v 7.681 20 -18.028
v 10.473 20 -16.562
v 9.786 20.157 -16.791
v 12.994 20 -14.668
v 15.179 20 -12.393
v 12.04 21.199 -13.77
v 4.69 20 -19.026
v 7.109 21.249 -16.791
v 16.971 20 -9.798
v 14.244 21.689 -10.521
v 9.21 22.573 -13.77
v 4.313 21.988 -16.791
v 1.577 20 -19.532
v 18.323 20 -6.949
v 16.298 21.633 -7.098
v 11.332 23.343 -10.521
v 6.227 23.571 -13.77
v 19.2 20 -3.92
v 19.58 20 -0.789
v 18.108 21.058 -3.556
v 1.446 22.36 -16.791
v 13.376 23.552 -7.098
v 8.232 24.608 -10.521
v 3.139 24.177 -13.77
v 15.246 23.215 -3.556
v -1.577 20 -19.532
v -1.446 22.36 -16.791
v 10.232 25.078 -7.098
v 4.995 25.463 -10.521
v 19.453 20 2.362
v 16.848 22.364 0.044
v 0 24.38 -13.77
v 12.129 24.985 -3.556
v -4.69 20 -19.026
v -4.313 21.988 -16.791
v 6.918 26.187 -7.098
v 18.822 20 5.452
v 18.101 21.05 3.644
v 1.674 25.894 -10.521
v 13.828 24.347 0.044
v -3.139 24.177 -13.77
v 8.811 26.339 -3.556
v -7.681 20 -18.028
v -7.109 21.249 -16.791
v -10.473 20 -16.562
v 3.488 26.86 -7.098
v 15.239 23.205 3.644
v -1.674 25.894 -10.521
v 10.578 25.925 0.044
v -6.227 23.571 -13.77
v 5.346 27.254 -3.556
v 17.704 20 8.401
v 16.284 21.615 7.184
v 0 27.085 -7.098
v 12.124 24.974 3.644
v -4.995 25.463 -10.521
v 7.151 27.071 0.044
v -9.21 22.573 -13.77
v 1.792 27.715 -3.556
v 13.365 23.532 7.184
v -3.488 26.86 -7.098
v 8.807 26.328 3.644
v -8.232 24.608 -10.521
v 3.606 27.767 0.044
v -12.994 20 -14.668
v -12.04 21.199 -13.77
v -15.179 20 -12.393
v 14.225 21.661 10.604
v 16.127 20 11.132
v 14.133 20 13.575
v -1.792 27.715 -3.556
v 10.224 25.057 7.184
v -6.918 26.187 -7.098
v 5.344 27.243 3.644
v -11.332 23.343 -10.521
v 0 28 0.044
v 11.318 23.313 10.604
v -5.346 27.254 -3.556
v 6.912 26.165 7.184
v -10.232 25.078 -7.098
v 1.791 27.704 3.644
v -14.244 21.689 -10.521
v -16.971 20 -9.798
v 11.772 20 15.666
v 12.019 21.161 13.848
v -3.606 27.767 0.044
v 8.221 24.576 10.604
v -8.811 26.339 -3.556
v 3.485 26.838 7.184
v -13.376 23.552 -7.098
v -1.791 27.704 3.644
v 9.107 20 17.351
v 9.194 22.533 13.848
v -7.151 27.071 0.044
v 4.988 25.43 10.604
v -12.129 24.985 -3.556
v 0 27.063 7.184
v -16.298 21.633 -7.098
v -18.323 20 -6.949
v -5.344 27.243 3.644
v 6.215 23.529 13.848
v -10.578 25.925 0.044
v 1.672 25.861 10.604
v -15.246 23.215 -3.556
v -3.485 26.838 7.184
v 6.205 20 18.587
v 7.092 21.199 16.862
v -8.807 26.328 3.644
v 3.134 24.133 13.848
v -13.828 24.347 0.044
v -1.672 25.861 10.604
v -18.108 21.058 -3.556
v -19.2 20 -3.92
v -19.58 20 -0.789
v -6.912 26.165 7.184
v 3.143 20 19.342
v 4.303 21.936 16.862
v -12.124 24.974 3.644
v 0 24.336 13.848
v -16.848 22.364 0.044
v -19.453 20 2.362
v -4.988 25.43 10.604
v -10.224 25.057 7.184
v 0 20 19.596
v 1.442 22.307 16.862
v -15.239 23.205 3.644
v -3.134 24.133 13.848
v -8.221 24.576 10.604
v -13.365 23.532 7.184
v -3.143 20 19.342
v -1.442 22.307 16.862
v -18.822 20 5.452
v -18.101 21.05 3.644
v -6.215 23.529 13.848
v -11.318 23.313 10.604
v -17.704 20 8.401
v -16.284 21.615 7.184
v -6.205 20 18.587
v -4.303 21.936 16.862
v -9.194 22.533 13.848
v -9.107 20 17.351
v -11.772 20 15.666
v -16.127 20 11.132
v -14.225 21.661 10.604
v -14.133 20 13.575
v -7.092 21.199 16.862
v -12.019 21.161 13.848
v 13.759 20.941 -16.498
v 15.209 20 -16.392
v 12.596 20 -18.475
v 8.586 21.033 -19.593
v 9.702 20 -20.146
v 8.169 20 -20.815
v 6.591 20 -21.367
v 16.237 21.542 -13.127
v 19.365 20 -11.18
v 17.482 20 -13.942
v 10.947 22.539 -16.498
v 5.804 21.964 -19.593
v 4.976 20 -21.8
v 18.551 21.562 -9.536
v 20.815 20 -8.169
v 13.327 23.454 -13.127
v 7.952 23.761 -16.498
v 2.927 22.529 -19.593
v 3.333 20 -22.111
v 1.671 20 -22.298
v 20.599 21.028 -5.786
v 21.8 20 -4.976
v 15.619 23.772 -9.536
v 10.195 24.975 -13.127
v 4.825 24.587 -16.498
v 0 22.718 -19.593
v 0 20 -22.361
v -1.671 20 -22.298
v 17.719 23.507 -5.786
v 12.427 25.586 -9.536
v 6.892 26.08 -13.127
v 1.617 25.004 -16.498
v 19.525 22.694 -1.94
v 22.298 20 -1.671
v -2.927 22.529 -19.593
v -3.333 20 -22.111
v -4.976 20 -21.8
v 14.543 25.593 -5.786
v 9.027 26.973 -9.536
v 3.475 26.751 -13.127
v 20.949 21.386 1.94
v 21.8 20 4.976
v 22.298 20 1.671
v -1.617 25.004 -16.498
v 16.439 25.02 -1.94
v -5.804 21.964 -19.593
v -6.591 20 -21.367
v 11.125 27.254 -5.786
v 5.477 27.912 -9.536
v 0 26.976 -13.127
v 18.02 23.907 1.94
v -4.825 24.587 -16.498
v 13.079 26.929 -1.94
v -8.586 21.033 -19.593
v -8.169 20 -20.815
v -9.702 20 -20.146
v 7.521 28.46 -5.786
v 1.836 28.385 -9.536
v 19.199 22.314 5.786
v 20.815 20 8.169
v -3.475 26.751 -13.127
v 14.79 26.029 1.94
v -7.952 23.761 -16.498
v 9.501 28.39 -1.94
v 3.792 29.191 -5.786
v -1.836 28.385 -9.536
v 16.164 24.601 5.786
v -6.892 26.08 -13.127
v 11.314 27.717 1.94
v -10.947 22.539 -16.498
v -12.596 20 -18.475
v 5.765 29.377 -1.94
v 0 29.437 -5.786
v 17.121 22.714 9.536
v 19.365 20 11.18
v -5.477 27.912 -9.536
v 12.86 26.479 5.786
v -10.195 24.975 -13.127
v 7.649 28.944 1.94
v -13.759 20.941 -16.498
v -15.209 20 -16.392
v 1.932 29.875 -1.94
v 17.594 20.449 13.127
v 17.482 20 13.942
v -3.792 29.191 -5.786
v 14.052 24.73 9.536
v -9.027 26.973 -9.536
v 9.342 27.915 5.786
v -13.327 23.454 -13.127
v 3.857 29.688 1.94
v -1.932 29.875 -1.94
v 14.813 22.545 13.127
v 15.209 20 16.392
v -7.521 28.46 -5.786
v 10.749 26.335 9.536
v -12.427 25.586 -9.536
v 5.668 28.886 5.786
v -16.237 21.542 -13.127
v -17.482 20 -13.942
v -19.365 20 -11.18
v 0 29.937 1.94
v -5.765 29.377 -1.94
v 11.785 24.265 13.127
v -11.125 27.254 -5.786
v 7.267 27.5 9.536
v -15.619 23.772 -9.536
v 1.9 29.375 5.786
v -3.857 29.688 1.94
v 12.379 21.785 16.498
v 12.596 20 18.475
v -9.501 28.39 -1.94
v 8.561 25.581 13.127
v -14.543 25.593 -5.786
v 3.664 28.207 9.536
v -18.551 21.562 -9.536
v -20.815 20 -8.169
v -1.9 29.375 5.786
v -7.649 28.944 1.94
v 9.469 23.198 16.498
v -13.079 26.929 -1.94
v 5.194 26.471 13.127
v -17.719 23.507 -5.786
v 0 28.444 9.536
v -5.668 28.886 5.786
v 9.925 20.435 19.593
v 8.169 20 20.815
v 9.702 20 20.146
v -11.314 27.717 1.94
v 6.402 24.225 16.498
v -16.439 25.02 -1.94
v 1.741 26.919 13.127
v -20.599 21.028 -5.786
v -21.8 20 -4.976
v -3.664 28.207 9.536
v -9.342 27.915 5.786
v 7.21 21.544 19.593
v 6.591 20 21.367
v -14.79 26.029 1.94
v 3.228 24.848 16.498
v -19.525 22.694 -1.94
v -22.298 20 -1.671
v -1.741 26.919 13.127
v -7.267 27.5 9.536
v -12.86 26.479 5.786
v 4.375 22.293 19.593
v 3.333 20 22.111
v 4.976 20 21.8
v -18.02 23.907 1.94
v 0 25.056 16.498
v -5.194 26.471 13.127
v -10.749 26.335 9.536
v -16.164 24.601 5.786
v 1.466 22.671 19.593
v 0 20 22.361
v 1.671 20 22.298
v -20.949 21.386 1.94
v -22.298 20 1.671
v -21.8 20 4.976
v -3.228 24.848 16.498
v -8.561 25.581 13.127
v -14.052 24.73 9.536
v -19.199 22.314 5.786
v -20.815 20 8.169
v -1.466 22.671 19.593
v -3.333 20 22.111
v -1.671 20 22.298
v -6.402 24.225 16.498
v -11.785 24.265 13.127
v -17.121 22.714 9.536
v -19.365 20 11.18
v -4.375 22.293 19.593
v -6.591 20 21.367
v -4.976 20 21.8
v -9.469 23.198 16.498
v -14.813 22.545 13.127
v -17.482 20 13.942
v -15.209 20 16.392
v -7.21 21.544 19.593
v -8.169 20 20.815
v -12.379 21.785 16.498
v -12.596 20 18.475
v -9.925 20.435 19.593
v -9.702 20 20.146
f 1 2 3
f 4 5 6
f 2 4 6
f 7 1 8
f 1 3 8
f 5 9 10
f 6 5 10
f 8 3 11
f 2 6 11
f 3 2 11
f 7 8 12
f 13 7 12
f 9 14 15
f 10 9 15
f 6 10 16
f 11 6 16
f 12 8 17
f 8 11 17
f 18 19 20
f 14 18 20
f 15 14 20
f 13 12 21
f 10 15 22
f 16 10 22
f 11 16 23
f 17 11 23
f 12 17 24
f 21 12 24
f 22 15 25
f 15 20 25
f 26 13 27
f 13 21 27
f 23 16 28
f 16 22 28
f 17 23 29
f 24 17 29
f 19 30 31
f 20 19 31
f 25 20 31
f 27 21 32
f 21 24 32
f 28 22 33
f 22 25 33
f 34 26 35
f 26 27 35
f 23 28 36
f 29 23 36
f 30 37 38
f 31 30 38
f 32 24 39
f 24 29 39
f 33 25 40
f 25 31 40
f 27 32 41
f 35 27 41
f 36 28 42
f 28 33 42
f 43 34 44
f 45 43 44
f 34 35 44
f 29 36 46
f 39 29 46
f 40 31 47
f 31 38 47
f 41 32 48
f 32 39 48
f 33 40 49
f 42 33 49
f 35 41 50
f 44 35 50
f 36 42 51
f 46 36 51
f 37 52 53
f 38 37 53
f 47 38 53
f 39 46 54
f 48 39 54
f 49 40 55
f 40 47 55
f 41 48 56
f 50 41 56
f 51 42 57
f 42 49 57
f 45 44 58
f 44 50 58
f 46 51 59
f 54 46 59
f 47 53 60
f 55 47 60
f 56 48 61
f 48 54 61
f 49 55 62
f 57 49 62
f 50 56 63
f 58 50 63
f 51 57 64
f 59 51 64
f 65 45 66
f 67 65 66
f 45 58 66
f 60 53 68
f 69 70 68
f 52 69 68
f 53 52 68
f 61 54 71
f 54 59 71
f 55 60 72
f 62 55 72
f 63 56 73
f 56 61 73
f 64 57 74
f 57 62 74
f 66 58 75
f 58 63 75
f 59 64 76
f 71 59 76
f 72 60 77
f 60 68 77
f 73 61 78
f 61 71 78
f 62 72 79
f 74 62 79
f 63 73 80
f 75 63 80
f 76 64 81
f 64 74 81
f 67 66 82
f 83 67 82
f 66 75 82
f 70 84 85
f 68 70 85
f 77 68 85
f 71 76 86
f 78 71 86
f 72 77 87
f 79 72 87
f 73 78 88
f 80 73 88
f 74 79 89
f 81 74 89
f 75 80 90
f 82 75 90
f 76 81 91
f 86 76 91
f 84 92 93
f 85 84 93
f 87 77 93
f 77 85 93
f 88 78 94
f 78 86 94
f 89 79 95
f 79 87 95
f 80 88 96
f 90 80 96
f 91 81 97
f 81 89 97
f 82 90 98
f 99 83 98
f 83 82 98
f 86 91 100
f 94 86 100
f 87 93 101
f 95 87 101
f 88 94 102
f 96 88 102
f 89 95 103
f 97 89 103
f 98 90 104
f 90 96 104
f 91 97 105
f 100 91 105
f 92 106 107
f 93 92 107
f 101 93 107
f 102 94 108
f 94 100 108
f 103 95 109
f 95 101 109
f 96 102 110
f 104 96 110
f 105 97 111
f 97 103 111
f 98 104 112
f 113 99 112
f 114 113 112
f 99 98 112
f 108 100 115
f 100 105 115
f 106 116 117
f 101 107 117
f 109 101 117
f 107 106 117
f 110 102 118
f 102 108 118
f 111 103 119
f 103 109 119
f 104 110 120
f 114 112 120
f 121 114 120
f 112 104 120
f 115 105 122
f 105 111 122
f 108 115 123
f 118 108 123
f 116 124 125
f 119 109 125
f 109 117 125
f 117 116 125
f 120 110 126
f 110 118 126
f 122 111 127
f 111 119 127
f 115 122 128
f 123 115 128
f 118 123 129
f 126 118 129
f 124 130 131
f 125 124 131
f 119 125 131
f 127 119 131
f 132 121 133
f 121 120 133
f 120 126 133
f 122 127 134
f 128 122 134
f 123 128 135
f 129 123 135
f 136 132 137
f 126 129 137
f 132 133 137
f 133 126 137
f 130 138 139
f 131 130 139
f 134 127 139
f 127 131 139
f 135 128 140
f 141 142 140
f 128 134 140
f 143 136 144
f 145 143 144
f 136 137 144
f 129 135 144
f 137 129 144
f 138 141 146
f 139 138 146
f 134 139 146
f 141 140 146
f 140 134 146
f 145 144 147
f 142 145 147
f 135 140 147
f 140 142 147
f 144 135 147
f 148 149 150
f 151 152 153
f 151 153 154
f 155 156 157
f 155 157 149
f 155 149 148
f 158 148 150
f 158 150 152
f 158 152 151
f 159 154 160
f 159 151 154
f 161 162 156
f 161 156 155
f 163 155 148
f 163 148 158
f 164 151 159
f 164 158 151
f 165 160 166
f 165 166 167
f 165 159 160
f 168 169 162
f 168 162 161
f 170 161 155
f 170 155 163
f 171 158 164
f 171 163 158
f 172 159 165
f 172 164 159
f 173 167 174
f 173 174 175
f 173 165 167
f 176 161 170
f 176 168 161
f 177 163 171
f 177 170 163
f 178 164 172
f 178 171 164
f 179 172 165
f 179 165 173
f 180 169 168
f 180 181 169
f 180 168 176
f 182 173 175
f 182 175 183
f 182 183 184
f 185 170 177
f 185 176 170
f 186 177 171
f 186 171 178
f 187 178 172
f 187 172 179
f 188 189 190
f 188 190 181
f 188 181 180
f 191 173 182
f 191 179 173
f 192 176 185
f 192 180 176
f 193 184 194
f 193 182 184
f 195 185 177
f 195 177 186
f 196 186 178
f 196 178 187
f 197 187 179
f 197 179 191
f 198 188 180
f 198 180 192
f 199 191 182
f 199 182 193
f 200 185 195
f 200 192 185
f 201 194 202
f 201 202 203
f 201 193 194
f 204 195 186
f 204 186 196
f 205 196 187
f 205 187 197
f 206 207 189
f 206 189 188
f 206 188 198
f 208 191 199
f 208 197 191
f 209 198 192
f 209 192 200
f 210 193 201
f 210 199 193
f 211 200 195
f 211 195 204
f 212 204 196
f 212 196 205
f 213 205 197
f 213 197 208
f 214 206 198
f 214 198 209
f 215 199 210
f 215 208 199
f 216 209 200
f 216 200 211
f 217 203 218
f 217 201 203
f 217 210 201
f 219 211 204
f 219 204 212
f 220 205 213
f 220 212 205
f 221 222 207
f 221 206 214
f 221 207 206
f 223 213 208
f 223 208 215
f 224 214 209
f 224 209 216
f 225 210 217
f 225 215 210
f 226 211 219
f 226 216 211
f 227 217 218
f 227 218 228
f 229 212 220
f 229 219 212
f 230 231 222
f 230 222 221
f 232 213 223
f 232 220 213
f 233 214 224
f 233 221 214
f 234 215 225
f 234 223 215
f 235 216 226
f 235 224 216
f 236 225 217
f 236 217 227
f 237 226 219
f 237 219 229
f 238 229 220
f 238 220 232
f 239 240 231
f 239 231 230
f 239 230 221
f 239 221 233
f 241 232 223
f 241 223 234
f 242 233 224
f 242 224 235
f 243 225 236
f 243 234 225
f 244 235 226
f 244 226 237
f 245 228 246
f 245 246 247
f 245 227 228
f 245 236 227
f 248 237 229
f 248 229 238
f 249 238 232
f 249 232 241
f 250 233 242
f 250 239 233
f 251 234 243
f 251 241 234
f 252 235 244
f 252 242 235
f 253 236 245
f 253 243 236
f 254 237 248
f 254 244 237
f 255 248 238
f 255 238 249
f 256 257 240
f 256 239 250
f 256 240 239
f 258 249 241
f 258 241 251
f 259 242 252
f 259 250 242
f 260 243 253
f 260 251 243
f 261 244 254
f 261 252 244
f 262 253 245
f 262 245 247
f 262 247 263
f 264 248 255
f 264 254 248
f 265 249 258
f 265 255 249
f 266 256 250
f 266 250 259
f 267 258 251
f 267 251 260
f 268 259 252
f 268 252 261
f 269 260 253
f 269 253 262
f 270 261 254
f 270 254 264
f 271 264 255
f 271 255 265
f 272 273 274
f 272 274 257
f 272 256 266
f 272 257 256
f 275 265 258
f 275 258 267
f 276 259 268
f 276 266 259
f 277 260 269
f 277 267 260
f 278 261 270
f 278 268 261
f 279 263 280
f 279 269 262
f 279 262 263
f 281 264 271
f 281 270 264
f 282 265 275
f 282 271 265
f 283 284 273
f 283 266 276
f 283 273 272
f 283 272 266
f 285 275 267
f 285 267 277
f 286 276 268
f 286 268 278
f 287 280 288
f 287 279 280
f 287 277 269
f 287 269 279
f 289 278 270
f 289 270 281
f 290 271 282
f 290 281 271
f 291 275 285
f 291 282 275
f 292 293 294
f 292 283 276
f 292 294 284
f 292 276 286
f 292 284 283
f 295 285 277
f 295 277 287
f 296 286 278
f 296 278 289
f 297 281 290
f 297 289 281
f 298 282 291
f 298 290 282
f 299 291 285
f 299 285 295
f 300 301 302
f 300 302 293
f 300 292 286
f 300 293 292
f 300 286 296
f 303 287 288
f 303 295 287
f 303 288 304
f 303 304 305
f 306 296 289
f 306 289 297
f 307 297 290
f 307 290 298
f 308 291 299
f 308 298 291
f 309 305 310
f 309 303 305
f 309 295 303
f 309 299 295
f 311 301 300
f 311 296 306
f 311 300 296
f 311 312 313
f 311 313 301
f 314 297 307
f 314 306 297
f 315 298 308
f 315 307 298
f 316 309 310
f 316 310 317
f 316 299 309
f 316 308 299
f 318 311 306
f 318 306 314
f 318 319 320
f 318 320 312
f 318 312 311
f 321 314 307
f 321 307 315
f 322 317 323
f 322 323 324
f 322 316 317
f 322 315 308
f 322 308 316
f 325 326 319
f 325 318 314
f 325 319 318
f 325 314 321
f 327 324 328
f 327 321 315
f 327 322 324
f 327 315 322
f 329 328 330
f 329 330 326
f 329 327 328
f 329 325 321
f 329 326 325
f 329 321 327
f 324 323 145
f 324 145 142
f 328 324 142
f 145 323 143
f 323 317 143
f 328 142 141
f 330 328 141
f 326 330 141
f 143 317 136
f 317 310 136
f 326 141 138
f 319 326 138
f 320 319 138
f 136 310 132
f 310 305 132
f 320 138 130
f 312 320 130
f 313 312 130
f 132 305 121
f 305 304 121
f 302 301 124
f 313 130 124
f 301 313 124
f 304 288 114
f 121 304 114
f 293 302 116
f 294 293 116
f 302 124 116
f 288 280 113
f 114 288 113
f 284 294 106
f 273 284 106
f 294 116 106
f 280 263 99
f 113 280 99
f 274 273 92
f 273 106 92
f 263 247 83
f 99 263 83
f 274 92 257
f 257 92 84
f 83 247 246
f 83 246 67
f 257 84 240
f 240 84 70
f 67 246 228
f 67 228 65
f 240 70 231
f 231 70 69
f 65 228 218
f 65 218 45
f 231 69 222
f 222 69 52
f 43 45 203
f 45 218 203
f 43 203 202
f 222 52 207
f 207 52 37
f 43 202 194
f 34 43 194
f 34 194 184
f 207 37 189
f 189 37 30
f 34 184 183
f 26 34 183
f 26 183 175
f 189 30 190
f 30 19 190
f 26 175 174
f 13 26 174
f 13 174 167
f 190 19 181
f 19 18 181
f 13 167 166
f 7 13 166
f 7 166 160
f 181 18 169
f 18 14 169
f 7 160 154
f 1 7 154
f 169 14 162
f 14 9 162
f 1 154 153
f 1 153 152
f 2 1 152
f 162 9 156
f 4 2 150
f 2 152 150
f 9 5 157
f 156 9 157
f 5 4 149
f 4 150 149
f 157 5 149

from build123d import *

# Parameters (mm, degrees)
BOX_W           = 60
BOX_H           = 60
BOX_DEPTH       = 60
SPHERE001_ANGLE = 180
SPHERE_ANGLE    = 180


with BuildPart() as cube:
    # Box → Box (new body)
    with BuildSketch(Plane(origin=(-30, -40, -30), x_dir=(1, 0, 0), z_dir=(0, 0, 1))):
        with Locations((30, 30)):
            Rectangle(BOX_W, BOX_H)
    extrude(amount=BOX_DEPTH)


with BuildPart() as inner:
    # Sphere001 → Sphere001 (revolve)
    with BuildSketch(Plane.XZ):
        with BuildLine():
            ThreePointArc((0, -28), (28, 0), (0, 28))
            Line((0, 28), (0, -28))
        make_face()
    revolve(axis=Axis((0, 0, 0), (0, 0, 1)), revolution_arc=SPHERE001_ANGLE)


with BuildPart() as cutshell:
    # Sphere → Sphere (revolve)
    with BuildSketch(Plane.XZ):
        with BuildLine():
            ThreePointArc((0, -30), (30, 0), (0, 30))
            Line((0, 30), (0, -30))
        make_face()
    revolve(axis=Axis((0, 0, 0), (0, 0, 1)), revolution_arc=SPHERE_ANGLE)

    # Cut: cut Inner
    add(inner.part, mode=Mode.SUBTRACT)

    # Cut001: cut Cube
    add(cube.part, mode=Mode.SUBTRACT)


solid = cutshell.part
